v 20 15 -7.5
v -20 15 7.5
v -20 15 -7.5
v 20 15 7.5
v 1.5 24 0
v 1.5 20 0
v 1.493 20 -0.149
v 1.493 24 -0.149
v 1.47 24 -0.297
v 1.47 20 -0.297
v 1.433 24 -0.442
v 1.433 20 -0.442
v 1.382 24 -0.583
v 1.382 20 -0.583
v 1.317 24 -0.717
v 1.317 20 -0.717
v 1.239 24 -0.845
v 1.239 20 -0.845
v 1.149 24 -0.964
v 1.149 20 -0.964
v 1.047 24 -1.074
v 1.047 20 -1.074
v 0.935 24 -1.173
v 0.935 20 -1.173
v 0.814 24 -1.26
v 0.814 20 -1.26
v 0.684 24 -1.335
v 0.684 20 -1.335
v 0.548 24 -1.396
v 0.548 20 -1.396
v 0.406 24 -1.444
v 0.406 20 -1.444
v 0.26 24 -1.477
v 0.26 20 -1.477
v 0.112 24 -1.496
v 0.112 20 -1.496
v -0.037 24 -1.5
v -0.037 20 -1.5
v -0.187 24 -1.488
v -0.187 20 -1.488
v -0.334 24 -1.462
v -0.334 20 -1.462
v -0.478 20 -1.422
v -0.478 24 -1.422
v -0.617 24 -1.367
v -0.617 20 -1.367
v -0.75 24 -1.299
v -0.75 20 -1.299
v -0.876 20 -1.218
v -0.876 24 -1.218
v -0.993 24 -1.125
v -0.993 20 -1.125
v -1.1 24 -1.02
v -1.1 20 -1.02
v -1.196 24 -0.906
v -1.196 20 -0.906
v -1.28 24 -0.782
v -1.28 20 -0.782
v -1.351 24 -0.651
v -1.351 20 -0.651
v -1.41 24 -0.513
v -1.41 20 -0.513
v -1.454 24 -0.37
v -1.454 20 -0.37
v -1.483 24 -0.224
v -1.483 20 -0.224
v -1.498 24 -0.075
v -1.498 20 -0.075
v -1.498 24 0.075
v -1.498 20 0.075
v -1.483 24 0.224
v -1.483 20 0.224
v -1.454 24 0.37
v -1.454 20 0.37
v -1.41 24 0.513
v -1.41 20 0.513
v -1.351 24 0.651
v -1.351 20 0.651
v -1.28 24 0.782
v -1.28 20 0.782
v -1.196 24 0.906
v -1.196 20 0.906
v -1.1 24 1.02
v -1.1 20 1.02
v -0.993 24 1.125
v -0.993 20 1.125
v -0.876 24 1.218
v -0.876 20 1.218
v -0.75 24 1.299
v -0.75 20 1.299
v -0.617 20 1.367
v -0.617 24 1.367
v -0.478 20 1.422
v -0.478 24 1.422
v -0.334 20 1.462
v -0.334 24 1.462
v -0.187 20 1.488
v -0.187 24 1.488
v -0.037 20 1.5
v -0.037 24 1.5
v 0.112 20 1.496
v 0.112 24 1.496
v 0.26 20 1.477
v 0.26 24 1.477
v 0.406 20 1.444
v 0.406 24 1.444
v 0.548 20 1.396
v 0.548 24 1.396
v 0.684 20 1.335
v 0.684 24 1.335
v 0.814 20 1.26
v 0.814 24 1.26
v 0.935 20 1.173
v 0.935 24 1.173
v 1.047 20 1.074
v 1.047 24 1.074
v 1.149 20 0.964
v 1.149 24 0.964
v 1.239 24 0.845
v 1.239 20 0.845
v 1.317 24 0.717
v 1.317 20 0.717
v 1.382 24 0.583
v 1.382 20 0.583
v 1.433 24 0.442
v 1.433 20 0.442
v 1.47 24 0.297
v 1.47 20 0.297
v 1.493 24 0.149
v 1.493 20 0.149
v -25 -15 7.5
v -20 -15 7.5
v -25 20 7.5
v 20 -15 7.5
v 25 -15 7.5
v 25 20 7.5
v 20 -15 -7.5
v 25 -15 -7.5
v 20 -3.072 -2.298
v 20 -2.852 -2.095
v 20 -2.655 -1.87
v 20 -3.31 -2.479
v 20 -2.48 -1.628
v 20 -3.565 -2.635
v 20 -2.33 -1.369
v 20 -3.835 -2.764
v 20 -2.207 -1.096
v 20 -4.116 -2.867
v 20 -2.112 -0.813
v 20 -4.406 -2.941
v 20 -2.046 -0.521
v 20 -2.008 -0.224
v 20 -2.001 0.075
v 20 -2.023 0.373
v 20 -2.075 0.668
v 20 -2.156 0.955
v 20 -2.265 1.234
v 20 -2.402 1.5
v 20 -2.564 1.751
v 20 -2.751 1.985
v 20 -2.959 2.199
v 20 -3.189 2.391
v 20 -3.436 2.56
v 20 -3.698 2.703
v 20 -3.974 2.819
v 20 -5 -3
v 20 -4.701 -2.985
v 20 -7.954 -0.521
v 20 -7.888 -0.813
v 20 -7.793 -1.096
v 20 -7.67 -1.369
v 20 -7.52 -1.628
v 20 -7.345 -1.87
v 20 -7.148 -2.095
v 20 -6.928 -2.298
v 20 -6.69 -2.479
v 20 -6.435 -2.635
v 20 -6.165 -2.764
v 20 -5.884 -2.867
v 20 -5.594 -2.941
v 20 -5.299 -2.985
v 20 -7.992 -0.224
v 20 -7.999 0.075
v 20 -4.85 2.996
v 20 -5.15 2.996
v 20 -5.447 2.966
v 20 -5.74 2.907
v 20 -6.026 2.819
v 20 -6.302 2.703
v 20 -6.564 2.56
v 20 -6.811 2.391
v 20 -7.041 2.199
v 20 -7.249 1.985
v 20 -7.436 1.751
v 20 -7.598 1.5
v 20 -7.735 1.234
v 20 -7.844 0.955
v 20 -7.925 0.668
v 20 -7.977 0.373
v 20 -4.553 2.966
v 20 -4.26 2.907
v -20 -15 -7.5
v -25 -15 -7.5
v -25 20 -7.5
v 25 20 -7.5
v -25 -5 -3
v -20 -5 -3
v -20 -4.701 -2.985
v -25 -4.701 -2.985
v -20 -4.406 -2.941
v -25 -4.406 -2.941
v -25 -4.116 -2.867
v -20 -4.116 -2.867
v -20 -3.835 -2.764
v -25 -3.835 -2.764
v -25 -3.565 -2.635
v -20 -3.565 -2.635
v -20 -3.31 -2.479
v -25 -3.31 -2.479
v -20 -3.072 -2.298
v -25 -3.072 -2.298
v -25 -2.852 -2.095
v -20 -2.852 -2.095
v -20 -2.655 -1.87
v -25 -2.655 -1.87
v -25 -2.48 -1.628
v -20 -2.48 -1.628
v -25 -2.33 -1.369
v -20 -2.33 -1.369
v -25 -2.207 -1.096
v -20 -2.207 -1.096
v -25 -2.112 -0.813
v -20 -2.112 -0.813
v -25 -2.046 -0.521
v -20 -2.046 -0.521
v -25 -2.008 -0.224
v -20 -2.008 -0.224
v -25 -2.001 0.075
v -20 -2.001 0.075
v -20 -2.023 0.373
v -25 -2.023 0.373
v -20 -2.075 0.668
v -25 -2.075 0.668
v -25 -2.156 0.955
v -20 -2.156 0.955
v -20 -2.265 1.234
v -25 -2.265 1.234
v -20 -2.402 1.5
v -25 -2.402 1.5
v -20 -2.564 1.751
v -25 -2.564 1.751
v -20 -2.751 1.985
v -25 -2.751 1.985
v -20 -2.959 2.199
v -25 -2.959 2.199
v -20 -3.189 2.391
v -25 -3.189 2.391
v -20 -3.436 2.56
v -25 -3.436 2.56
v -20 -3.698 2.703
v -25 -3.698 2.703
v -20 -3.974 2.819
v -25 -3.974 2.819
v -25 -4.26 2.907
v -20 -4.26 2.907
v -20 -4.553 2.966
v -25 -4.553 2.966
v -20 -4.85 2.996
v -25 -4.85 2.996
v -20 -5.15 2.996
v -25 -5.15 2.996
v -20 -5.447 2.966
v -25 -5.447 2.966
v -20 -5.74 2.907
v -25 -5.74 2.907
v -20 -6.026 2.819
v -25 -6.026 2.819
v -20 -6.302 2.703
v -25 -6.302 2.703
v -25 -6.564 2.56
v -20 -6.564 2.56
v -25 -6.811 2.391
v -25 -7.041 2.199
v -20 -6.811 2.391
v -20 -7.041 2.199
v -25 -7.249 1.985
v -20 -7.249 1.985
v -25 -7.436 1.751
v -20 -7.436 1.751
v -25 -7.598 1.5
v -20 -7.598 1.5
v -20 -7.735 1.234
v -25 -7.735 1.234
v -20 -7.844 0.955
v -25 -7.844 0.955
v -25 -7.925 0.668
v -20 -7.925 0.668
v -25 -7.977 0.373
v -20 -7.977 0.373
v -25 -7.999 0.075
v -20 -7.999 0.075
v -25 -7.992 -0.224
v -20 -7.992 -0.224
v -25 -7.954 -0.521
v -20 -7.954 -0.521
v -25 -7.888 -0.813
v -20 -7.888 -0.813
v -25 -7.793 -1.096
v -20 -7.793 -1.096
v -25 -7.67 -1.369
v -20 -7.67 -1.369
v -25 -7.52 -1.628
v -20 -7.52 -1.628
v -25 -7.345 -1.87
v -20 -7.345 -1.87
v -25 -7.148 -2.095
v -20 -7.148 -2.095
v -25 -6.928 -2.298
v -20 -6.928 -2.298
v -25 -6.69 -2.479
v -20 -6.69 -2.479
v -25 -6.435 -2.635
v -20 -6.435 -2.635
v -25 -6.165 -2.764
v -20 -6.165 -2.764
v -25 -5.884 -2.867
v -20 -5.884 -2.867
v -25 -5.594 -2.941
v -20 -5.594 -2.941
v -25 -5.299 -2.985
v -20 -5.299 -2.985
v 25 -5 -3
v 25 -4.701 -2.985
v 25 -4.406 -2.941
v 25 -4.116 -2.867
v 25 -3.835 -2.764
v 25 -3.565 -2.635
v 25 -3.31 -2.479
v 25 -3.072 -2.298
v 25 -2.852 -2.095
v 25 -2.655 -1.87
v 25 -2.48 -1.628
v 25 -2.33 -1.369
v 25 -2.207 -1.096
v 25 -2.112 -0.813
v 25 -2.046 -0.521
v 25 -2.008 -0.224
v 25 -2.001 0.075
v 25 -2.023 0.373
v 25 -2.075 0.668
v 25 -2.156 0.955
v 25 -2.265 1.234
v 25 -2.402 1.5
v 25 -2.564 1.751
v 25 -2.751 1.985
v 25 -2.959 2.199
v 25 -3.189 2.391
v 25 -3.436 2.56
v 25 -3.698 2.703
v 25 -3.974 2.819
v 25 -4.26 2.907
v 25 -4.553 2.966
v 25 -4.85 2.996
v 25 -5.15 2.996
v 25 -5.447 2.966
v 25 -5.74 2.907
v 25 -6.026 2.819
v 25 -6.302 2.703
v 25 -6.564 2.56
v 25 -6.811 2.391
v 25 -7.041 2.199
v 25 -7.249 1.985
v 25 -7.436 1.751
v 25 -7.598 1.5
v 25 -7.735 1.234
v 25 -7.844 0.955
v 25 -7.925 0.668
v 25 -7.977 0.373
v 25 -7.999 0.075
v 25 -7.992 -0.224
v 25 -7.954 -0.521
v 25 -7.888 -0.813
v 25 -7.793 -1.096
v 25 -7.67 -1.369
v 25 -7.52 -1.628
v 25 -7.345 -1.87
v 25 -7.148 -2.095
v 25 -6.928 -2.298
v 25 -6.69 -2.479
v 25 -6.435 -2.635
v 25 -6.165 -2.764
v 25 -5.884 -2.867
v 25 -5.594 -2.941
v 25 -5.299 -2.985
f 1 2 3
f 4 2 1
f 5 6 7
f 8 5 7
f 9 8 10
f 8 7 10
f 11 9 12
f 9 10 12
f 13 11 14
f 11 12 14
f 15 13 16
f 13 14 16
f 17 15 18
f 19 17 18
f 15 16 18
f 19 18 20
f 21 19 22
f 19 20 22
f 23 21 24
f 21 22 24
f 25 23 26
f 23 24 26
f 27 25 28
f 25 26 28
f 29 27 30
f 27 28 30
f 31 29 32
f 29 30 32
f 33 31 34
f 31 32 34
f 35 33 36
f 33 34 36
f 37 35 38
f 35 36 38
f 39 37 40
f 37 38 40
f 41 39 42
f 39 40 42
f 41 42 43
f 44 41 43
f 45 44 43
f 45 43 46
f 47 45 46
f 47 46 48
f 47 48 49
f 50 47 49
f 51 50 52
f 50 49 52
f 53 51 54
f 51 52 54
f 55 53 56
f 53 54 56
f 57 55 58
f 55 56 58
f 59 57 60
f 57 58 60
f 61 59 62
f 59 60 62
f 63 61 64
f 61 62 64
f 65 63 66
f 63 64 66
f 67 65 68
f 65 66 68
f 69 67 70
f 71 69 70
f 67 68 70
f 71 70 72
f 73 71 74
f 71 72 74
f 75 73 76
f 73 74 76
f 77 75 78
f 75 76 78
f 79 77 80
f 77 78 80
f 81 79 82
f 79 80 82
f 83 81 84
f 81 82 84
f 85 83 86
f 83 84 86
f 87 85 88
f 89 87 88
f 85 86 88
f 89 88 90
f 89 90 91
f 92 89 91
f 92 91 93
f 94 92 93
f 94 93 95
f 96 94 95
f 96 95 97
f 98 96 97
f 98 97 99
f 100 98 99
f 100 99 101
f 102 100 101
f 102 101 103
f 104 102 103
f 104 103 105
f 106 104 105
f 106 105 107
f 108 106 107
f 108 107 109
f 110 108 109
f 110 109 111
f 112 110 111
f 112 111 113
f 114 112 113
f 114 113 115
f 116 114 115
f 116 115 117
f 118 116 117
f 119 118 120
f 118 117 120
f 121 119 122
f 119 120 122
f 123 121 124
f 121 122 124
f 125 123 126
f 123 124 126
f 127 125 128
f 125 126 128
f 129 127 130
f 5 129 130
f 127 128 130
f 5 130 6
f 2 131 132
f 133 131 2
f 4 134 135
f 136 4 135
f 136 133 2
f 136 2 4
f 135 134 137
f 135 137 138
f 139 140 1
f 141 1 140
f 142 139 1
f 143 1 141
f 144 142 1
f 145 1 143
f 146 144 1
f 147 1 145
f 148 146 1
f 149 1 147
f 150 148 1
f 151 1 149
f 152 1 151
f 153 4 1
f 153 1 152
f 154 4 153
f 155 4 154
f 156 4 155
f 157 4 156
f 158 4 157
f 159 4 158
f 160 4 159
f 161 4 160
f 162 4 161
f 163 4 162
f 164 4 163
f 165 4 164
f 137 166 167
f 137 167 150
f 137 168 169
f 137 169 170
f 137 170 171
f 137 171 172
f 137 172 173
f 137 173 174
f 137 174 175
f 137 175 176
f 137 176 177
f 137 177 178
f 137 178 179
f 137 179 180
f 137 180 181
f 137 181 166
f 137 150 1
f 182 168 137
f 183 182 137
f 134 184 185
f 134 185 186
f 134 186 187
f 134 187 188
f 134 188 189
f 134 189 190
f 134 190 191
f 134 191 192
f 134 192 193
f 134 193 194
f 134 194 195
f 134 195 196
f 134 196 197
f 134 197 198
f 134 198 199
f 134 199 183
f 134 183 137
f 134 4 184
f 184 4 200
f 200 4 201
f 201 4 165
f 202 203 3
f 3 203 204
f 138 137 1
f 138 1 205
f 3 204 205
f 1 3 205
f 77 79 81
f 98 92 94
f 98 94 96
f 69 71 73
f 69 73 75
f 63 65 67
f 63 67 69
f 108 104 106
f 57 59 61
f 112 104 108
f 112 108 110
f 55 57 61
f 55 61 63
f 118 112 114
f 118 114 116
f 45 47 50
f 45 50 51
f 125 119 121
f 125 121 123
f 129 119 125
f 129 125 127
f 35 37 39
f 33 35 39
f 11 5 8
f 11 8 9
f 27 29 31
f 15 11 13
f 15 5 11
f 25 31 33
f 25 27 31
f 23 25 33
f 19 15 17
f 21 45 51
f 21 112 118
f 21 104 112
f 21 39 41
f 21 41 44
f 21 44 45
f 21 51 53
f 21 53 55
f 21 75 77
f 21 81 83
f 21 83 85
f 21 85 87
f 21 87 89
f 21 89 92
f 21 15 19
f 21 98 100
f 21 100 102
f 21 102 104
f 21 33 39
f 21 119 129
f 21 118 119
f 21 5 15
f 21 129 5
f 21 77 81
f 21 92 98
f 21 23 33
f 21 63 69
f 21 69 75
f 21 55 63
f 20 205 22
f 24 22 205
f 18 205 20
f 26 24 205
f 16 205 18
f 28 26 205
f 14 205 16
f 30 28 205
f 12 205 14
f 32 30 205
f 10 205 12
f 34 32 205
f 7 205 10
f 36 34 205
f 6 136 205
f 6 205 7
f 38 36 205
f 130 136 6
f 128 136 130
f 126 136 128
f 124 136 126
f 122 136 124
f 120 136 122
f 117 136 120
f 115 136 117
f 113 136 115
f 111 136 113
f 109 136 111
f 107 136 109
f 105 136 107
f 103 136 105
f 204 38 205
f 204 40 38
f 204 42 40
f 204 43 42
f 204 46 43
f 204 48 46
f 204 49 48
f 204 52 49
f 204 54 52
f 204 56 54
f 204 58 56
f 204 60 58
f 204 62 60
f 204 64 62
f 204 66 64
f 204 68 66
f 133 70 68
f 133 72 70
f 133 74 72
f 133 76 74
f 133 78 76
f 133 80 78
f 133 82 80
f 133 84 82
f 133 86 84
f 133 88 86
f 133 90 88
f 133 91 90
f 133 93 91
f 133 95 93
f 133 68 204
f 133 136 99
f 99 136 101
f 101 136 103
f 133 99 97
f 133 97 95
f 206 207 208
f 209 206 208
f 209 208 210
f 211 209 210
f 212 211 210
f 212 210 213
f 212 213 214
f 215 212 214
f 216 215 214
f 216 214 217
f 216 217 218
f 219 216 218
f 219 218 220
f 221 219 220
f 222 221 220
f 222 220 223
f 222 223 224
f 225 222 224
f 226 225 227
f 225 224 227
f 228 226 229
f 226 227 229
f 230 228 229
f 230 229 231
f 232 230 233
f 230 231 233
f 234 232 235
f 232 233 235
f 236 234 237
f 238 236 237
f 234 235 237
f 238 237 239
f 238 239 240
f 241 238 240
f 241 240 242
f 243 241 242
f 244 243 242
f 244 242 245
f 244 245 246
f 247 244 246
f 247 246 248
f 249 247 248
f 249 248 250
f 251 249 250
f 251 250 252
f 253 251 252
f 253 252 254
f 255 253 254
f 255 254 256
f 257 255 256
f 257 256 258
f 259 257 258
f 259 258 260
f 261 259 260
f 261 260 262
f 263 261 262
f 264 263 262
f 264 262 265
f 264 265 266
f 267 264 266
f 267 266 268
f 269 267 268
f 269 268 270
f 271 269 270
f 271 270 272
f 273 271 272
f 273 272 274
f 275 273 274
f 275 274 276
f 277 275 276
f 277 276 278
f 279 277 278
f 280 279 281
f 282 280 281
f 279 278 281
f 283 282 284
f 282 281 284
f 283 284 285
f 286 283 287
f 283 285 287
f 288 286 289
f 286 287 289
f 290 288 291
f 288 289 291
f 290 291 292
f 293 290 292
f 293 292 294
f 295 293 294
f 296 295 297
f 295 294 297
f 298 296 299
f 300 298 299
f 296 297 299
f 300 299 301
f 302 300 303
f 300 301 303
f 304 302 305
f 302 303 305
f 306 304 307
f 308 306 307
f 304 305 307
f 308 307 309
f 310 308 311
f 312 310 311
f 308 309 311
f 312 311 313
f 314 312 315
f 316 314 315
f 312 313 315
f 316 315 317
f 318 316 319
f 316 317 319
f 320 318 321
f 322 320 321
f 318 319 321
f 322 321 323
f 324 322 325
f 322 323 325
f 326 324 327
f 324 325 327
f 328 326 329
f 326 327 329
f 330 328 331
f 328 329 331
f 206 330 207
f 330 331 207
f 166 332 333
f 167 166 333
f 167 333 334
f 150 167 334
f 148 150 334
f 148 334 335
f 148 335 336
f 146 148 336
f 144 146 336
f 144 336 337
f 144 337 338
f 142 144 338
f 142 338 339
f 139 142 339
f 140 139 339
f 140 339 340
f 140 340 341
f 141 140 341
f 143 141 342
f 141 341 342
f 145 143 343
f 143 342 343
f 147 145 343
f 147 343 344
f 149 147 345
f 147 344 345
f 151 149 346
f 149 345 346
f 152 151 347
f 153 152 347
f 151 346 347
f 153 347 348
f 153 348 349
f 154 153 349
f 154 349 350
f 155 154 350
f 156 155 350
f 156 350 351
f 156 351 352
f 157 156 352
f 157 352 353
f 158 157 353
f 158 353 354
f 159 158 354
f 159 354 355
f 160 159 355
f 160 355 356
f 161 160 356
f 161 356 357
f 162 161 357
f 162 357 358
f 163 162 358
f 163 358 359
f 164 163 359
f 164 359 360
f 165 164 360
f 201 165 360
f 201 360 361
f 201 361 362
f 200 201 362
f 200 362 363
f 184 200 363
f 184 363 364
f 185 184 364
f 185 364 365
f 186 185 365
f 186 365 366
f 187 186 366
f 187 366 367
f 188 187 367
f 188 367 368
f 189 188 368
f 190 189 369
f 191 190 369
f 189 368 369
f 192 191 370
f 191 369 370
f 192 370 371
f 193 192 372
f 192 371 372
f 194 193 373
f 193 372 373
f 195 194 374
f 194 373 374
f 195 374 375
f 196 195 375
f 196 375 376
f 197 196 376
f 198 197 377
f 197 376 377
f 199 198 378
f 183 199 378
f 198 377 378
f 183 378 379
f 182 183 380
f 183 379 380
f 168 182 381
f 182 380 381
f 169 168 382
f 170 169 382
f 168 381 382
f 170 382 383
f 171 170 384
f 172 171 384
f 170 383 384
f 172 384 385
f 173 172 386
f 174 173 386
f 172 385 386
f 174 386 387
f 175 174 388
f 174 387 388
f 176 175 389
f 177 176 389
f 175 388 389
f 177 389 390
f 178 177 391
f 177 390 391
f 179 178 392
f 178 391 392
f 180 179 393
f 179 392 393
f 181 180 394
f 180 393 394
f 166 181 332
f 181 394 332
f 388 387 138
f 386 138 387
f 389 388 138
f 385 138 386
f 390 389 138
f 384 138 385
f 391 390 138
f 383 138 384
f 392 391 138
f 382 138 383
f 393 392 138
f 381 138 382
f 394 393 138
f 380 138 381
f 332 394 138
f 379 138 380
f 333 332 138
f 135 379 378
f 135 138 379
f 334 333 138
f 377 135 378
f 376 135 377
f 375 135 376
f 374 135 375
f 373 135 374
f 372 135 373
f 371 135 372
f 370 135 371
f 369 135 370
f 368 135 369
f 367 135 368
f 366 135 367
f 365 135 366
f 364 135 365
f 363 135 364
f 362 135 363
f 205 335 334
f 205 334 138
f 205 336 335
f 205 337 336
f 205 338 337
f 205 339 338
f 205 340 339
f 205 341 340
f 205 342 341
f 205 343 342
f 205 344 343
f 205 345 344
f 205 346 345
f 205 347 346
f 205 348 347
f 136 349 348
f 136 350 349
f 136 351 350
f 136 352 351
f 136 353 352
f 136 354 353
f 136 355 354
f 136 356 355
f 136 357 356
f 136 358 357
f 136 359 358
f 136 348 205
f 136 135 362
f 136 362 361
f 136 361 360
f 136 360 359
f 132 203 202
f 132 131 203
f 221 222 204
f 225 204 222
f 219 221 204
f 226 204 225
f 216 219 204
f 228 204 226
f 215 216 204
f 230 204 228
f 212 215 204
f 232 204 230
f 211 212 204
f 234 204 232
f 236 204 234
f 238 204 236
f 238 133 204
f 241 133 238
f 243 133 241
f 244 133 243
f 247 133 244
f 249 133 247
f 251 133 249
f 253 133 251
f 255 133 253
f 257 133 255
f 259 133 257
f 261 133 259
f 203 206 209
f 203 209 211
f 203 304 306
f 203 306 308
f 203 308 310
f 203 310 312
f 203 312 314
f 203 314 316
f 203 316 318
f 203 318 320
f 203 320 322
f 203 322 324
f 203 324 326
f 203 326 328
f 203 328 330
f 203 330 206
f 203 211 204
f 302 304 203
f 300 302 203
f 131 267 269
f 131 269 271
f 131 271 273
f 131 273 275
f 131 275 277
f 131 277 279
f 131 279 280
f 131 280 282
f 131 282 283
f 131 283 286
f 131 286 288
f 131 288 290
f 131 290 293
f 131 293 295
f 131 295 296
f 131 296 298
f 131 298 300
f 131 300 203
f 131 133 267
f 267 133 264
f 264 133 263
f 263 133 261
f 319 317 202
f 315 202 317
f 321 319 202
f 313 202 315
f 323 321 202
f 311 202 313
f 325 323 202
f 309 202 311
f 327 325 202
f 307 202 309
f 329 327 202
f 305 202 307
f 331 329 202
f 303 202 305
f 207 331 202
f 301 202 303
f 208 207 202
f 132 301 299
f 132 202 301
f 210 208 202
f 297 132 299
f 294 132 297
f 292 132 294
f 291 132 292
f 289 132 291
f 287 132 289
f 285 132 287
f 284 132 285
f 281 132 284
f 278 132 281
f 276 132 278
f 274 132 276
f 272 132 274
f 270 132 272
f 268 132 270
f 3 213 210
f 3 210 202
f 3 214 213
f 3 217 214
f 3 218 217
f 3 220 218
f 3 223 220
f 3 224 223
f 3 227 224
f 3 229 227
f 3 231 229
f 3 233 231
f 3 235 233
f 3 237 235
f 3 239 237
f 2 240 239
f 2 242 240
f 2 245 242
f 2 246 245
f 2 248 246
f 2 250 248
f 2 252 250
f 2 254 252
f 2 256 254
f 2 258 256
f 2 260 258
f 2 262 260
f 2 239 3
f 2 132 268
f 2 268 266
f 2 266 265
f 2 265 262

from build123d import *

# Parameters (mm, degrees)
EXTRUDE_THIN1_DEPTH     = 7.5
SKETCH2_R               = 1.5
BOSS_EXTRUDE1_DEPTH     = 4
SKETCH3_R               = 3
CUT_EXTRUDE1_DEPTH      = 1
CUT_EXTRUDE1_DEPTH_BACK = 51


with BuildPart() as part:
    # Sketch1 → Extrude-Thin1 (new body, symmetric)
    with BuildSketch(Plane.XY):
        Polygon((-20, -15), (-20, 15), (20, 15), (20, -15), (25, -15), (25, 20), (-25, 20), (-25, -15), align=None)
    extrude(amount=EXTRUDE_THIN1_DEPTH, both=True)

    # Sketch2 → Boss-Extrude1 (add)
    with BuildSketch(Plane(origin=(0, 20, 0), x_dir=(1, 0, 0), z_dir=(0, 1, 0))):
        Circle(SKETCH2_R)
    extrude(amount=BOSS_EXTRUDE1_DEPTH)

    # Sketch3 → Cut-Extrude1 (cut, two sides)
    with BuildSketch(Plane(origin=(25, 0, 0), x_dir=(0, 0, -1), z_dir=(1, 0, 0))) as cut_extrude1_sk:
        with Locations((0, -5)):
            Circle(SKETCH3_R)
    extrude(amount=CUT_EXTRUDE1_DEPTH, mode=Mode.SUBTRACT)
    extrude(cut_extrude1_sk.sketch, amount=-CUT_EXTRUDE1_DEPTH_BACK, mode=Mode.SUBTRACT)


solid = part.part
